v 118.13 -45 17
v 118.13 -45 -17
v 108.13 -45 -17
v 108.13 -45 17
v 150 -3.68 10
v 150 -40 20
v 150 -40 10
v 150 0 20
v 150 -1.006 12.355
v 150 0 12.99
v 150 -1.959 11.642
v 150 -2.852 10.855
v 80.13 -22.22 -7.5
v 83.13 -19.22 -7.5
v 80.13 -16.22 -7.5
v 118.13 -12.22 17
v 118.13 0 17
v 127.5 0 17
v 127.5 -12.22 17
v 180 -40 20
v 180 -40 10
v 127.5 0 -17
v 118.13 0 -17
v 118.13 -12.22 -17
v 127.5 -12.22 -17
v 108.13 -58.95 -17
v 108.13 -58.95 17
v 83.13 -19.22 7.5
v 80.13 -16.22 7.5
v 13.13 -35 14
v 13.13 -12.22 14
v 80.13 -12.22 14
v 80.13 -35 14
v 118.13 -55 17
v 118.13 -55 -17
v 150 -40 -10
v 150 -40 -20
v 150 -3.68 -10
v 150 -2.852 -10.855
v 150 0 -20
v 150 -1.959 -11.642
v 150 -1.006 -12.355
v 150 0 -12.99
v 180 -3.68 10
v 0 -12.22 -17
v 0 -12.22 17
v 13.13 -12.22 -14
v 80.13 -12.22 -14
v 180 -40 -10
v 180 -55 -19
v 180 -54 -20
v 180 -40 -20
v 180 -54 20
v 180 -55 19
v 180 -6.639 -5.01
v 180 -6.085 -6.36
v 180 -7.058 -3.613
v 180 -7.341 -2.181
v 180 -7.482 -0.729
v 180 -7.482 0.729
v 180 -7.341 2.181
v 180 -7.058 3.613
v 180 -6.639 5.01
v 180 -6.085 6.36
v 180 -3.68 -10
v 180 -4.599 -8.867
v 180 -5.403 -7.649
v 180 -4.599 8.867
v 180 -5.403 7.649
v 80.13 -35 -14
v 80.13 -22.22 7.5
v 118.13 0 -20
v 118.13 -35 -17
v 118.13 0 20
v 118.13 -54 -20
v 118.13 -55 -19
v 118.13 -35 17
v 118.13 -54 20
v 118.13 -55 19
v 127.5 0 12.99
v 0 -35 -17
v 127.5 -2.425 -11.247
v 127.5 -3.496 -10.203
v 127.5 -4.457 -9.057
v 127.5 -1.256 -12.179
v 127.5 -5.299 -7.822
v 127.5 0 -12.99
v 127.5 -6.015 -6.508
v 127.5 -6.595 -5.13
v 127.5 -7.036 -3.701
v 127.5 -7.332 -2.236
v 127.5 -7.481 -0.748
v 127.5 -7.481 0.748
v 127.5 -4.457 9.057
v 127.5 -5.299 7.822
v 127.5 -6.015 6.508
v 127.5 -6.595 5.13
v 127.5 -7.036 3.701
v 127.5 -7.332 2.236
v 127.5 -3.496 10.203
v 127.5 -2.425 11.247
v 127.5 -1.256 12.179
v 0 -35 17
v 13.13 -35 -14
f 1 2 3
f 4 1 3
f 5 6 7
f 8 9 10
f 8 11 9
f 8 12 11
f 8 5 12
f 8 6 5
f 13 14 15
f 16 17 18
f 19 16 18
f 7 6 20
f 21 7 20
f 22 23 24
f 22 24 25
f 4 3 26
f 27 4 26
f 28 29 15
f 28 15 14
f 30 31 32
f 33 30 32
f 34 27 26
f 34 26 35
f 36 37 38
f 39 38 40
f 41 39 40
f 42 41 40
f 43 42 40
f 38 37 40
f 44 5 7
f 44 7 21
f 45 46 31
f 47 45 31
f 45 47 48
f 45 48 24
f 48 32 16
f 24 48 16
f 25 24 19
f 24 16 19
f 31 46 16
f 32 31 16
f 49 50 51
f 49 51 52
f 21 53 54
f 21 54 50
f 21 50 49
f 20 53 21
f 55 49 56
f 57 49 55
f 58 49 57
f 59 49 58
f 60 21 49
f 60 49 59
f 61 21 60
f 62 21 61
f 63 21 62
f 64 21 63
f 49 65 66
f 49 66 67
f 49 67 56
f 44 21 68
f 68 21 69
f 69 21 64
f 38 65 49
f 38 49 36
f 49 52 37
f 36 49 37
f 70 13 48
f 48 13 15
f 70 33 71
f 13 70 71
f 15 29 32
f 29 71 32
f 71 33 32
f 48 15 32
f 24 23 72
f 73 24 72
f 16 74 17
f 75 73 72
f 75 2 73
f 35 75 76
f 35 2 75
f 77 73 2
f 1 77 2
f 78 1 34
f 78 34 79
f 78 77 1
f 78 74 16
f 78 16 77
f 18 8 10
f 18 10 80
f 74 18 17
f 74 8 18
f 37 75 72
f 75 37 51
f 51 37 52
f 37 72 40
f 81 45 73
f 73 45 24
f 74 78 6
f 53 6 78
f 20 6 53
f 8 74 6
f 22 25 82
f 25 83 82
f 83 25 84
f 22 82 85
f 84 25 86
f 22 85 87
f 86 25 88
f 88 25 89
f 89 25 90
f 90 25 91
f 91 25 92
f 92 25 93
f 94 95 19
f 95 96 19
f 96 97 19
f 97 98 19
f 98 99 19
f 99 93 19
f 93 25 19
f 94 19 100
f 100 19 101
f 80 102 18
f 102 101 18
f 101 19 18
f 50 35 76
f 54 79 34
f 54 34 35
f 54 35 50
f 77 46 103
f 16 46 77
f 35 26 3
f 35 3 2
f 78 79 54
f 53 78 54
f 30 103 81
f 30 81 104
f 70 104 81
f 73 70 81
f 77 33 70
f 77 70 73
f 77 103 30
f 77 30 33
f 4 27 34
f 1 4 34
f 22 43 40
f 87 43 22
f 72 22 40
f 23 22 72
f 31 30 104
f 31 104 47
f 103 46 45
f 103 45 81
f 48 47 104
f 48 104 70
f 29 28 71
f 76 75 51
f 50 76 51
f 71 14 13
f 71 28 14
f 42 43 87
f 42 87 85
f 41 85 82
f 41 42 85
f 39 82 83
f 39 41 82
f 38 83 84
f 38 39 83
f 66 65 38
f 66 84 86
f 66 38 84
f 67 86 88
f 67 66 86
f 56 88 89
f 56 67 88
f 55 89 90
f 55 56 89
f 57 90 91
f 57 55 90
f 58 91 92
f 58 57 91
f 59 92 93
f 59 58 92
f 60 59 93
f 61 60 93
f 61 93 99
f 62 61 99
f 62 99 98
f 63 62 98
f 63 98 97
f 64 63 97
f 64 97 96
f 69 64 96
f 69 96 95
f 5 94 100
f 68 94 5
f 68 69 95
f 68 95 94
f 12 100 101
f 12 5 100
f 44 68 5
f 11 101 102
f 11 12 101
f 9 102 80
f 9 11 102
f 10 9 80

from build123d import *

# Parameters (mm, degrees)
EXTRUDE_1_DEPTH     = 17
EXTRUDE_2_DEPTH     = 20
SKETCH_2_W          = 127.5
SKETCH_2_H          = 12.22
CUT_EXTRUDE_1_DEPTH = 17
SKETCH_6_W          = 30
SKETCH_6_H          = 40
CUT_EXTRUDE_2_DEPTH = 10
SKETCH_7_W          = 30
SKETCH_7_H          = 40
CUT_EXTRUDE_3_DEPTH = 10
SKETCH_8_W          = 67
SKETCH_8_H          = 22.78
CUT_EXTRUDE_4_DEPTH = 14
CUT_EXTRUDE_6_DEPTH = 7.5
CUT_EXTRUDE_7_REACH = 192.46
CHAMFER_1_SIZE      = 1


with BuildPart() as part:
    # 스케치1 → 보스-돌출1 (new, symmetric)
    with BuildSketch(Plane.XY):
        Polygon((180, 0), (0, 0), (0, -35), (118.13, -35), (118.13, -45), (108.13, -45), (108.13, -58.95), (118.13, -55), (180, -55), align=None)
    extrude(amount=EXTRUDE_1_DEPTH, both=True)

    # 스케치1<3> → 보스-돌출2 (add, symmetric)
    with BuildSketch(Plane.XY):
        Polygon((180, 0), (127.5, 0), (118.13, 0), (118.13, -10), (118.13, -35), (118.13, -45), (118.13, -55), (180, -55), align=None)
    extrude(amount=EXTRUDE_2_DEPTH, both=True)

    # 스케치2 → 컷-돌출1 (cut, symmetric)
    with BuildSketch(Plane.XY):
        with Locations((63.75, -6.11)):
            Rectangle(SKETCH_2_W, SKETCH_2_H)
    extrude(amount=CUT_EXTRUDE_1_DEPTH, both=True, mode=Mode.SUBTRACT)

    # 스케치6 → 컷-돌출2 (cut)
    with BuildSketch(Plane.XY.offset(20)):
        with Locations((165, -20)):
            Rectangle(SKETCH_6_W, SKETCH_6_H)
    extrude(amount=-CUT_EXTRUDE_2_DEPTH, mode=Mode.SUBTRACT)

    # 스케치7 → 컷-돌출3 (cut)
    with BuildSketch(Plane(origin=(0, 0, -20), x_dir=(-1, 0, 0), z_dir=(0, 0, -1))):
        with Locations((-165, -20)):
            Rectangle(SKETCH_7_W, SKETCH_7_H)
    extrude(amount=-CUT_EXTRUDE_3_DEPTH, mode=Mode.SUBTRACT)

    # 스케치8 → 컷-돌출4 (cut, symmetric)
    with BuildSketch(Plane.XY):
        with Locations((46.63, -23.61)):
            Rectangle(SKETCH_8_W, SKETCH_8_H)
    extrude(amount=CUT_EXTRUDE_4_DEPTH, both=True, mode=Mode.SUBTRACT)

    # 스케치13 → 컷-돌출6 (cut, symmetric)
    with BuildSketch(Plane.XY):
        Polygon((80.13, -16.22), (83.13, -19.22), (80.13, -22.22), align=None)
    extrude(amount=CUT_EXTRUDE_6_DEPTH, both=True, mode=Mode.SUBTRACT)

    # 컷-돌출7: up to this face of the body (flat: up to its plane)
    cut_extrude_7_end = Plane(part.part.faces().sort_by_distance((127.5, -6.11, 0))[0])
    # 스케치14 → 컷-돌출7 (cut, up to the picked face)
    with BuildSketch(Plane(origin=(180, 0, 0), x_dir=(0, 0, -1), z_dir=(1, 0, 0)), mode=Mode.PRIVATE) as cut_extrude_7_sk1:
        with BuildLine():
            Line((-12.990381057, 0), (12.990381057, 0))
            ThreePointArc((12.990381057, 0), (0, -7.5), (-12.990381057, 0))
        make_face()
    cut_extrude_7_tool1 = split(extrude(cut_extrude_7_sk1.sketch, amount=-CUT_EXTRUDE_7_REACH, mode=Mode.PRIVATE), bisect_by=cut_extrude_7_end, keep=Keep.BOTH, mode=Mode.PRIVATE)
    add(cut_extrude_7_tool1.solids().sort_by(Axis((180, -3.075302, 0), (-1, 0, 0)))[0], mode=Mode.SUBTRACT)

    # 모따기1
    chamfer_1_edges = [part.edges().sort_by_distance(p)[0] for p in [
        (149.065, -55, -20),
        (149.065, -55, 20),
    ]]
    chamfer(chamfer_1_edges, length=CHAMFER_1_SIZE)


solid = part.part
